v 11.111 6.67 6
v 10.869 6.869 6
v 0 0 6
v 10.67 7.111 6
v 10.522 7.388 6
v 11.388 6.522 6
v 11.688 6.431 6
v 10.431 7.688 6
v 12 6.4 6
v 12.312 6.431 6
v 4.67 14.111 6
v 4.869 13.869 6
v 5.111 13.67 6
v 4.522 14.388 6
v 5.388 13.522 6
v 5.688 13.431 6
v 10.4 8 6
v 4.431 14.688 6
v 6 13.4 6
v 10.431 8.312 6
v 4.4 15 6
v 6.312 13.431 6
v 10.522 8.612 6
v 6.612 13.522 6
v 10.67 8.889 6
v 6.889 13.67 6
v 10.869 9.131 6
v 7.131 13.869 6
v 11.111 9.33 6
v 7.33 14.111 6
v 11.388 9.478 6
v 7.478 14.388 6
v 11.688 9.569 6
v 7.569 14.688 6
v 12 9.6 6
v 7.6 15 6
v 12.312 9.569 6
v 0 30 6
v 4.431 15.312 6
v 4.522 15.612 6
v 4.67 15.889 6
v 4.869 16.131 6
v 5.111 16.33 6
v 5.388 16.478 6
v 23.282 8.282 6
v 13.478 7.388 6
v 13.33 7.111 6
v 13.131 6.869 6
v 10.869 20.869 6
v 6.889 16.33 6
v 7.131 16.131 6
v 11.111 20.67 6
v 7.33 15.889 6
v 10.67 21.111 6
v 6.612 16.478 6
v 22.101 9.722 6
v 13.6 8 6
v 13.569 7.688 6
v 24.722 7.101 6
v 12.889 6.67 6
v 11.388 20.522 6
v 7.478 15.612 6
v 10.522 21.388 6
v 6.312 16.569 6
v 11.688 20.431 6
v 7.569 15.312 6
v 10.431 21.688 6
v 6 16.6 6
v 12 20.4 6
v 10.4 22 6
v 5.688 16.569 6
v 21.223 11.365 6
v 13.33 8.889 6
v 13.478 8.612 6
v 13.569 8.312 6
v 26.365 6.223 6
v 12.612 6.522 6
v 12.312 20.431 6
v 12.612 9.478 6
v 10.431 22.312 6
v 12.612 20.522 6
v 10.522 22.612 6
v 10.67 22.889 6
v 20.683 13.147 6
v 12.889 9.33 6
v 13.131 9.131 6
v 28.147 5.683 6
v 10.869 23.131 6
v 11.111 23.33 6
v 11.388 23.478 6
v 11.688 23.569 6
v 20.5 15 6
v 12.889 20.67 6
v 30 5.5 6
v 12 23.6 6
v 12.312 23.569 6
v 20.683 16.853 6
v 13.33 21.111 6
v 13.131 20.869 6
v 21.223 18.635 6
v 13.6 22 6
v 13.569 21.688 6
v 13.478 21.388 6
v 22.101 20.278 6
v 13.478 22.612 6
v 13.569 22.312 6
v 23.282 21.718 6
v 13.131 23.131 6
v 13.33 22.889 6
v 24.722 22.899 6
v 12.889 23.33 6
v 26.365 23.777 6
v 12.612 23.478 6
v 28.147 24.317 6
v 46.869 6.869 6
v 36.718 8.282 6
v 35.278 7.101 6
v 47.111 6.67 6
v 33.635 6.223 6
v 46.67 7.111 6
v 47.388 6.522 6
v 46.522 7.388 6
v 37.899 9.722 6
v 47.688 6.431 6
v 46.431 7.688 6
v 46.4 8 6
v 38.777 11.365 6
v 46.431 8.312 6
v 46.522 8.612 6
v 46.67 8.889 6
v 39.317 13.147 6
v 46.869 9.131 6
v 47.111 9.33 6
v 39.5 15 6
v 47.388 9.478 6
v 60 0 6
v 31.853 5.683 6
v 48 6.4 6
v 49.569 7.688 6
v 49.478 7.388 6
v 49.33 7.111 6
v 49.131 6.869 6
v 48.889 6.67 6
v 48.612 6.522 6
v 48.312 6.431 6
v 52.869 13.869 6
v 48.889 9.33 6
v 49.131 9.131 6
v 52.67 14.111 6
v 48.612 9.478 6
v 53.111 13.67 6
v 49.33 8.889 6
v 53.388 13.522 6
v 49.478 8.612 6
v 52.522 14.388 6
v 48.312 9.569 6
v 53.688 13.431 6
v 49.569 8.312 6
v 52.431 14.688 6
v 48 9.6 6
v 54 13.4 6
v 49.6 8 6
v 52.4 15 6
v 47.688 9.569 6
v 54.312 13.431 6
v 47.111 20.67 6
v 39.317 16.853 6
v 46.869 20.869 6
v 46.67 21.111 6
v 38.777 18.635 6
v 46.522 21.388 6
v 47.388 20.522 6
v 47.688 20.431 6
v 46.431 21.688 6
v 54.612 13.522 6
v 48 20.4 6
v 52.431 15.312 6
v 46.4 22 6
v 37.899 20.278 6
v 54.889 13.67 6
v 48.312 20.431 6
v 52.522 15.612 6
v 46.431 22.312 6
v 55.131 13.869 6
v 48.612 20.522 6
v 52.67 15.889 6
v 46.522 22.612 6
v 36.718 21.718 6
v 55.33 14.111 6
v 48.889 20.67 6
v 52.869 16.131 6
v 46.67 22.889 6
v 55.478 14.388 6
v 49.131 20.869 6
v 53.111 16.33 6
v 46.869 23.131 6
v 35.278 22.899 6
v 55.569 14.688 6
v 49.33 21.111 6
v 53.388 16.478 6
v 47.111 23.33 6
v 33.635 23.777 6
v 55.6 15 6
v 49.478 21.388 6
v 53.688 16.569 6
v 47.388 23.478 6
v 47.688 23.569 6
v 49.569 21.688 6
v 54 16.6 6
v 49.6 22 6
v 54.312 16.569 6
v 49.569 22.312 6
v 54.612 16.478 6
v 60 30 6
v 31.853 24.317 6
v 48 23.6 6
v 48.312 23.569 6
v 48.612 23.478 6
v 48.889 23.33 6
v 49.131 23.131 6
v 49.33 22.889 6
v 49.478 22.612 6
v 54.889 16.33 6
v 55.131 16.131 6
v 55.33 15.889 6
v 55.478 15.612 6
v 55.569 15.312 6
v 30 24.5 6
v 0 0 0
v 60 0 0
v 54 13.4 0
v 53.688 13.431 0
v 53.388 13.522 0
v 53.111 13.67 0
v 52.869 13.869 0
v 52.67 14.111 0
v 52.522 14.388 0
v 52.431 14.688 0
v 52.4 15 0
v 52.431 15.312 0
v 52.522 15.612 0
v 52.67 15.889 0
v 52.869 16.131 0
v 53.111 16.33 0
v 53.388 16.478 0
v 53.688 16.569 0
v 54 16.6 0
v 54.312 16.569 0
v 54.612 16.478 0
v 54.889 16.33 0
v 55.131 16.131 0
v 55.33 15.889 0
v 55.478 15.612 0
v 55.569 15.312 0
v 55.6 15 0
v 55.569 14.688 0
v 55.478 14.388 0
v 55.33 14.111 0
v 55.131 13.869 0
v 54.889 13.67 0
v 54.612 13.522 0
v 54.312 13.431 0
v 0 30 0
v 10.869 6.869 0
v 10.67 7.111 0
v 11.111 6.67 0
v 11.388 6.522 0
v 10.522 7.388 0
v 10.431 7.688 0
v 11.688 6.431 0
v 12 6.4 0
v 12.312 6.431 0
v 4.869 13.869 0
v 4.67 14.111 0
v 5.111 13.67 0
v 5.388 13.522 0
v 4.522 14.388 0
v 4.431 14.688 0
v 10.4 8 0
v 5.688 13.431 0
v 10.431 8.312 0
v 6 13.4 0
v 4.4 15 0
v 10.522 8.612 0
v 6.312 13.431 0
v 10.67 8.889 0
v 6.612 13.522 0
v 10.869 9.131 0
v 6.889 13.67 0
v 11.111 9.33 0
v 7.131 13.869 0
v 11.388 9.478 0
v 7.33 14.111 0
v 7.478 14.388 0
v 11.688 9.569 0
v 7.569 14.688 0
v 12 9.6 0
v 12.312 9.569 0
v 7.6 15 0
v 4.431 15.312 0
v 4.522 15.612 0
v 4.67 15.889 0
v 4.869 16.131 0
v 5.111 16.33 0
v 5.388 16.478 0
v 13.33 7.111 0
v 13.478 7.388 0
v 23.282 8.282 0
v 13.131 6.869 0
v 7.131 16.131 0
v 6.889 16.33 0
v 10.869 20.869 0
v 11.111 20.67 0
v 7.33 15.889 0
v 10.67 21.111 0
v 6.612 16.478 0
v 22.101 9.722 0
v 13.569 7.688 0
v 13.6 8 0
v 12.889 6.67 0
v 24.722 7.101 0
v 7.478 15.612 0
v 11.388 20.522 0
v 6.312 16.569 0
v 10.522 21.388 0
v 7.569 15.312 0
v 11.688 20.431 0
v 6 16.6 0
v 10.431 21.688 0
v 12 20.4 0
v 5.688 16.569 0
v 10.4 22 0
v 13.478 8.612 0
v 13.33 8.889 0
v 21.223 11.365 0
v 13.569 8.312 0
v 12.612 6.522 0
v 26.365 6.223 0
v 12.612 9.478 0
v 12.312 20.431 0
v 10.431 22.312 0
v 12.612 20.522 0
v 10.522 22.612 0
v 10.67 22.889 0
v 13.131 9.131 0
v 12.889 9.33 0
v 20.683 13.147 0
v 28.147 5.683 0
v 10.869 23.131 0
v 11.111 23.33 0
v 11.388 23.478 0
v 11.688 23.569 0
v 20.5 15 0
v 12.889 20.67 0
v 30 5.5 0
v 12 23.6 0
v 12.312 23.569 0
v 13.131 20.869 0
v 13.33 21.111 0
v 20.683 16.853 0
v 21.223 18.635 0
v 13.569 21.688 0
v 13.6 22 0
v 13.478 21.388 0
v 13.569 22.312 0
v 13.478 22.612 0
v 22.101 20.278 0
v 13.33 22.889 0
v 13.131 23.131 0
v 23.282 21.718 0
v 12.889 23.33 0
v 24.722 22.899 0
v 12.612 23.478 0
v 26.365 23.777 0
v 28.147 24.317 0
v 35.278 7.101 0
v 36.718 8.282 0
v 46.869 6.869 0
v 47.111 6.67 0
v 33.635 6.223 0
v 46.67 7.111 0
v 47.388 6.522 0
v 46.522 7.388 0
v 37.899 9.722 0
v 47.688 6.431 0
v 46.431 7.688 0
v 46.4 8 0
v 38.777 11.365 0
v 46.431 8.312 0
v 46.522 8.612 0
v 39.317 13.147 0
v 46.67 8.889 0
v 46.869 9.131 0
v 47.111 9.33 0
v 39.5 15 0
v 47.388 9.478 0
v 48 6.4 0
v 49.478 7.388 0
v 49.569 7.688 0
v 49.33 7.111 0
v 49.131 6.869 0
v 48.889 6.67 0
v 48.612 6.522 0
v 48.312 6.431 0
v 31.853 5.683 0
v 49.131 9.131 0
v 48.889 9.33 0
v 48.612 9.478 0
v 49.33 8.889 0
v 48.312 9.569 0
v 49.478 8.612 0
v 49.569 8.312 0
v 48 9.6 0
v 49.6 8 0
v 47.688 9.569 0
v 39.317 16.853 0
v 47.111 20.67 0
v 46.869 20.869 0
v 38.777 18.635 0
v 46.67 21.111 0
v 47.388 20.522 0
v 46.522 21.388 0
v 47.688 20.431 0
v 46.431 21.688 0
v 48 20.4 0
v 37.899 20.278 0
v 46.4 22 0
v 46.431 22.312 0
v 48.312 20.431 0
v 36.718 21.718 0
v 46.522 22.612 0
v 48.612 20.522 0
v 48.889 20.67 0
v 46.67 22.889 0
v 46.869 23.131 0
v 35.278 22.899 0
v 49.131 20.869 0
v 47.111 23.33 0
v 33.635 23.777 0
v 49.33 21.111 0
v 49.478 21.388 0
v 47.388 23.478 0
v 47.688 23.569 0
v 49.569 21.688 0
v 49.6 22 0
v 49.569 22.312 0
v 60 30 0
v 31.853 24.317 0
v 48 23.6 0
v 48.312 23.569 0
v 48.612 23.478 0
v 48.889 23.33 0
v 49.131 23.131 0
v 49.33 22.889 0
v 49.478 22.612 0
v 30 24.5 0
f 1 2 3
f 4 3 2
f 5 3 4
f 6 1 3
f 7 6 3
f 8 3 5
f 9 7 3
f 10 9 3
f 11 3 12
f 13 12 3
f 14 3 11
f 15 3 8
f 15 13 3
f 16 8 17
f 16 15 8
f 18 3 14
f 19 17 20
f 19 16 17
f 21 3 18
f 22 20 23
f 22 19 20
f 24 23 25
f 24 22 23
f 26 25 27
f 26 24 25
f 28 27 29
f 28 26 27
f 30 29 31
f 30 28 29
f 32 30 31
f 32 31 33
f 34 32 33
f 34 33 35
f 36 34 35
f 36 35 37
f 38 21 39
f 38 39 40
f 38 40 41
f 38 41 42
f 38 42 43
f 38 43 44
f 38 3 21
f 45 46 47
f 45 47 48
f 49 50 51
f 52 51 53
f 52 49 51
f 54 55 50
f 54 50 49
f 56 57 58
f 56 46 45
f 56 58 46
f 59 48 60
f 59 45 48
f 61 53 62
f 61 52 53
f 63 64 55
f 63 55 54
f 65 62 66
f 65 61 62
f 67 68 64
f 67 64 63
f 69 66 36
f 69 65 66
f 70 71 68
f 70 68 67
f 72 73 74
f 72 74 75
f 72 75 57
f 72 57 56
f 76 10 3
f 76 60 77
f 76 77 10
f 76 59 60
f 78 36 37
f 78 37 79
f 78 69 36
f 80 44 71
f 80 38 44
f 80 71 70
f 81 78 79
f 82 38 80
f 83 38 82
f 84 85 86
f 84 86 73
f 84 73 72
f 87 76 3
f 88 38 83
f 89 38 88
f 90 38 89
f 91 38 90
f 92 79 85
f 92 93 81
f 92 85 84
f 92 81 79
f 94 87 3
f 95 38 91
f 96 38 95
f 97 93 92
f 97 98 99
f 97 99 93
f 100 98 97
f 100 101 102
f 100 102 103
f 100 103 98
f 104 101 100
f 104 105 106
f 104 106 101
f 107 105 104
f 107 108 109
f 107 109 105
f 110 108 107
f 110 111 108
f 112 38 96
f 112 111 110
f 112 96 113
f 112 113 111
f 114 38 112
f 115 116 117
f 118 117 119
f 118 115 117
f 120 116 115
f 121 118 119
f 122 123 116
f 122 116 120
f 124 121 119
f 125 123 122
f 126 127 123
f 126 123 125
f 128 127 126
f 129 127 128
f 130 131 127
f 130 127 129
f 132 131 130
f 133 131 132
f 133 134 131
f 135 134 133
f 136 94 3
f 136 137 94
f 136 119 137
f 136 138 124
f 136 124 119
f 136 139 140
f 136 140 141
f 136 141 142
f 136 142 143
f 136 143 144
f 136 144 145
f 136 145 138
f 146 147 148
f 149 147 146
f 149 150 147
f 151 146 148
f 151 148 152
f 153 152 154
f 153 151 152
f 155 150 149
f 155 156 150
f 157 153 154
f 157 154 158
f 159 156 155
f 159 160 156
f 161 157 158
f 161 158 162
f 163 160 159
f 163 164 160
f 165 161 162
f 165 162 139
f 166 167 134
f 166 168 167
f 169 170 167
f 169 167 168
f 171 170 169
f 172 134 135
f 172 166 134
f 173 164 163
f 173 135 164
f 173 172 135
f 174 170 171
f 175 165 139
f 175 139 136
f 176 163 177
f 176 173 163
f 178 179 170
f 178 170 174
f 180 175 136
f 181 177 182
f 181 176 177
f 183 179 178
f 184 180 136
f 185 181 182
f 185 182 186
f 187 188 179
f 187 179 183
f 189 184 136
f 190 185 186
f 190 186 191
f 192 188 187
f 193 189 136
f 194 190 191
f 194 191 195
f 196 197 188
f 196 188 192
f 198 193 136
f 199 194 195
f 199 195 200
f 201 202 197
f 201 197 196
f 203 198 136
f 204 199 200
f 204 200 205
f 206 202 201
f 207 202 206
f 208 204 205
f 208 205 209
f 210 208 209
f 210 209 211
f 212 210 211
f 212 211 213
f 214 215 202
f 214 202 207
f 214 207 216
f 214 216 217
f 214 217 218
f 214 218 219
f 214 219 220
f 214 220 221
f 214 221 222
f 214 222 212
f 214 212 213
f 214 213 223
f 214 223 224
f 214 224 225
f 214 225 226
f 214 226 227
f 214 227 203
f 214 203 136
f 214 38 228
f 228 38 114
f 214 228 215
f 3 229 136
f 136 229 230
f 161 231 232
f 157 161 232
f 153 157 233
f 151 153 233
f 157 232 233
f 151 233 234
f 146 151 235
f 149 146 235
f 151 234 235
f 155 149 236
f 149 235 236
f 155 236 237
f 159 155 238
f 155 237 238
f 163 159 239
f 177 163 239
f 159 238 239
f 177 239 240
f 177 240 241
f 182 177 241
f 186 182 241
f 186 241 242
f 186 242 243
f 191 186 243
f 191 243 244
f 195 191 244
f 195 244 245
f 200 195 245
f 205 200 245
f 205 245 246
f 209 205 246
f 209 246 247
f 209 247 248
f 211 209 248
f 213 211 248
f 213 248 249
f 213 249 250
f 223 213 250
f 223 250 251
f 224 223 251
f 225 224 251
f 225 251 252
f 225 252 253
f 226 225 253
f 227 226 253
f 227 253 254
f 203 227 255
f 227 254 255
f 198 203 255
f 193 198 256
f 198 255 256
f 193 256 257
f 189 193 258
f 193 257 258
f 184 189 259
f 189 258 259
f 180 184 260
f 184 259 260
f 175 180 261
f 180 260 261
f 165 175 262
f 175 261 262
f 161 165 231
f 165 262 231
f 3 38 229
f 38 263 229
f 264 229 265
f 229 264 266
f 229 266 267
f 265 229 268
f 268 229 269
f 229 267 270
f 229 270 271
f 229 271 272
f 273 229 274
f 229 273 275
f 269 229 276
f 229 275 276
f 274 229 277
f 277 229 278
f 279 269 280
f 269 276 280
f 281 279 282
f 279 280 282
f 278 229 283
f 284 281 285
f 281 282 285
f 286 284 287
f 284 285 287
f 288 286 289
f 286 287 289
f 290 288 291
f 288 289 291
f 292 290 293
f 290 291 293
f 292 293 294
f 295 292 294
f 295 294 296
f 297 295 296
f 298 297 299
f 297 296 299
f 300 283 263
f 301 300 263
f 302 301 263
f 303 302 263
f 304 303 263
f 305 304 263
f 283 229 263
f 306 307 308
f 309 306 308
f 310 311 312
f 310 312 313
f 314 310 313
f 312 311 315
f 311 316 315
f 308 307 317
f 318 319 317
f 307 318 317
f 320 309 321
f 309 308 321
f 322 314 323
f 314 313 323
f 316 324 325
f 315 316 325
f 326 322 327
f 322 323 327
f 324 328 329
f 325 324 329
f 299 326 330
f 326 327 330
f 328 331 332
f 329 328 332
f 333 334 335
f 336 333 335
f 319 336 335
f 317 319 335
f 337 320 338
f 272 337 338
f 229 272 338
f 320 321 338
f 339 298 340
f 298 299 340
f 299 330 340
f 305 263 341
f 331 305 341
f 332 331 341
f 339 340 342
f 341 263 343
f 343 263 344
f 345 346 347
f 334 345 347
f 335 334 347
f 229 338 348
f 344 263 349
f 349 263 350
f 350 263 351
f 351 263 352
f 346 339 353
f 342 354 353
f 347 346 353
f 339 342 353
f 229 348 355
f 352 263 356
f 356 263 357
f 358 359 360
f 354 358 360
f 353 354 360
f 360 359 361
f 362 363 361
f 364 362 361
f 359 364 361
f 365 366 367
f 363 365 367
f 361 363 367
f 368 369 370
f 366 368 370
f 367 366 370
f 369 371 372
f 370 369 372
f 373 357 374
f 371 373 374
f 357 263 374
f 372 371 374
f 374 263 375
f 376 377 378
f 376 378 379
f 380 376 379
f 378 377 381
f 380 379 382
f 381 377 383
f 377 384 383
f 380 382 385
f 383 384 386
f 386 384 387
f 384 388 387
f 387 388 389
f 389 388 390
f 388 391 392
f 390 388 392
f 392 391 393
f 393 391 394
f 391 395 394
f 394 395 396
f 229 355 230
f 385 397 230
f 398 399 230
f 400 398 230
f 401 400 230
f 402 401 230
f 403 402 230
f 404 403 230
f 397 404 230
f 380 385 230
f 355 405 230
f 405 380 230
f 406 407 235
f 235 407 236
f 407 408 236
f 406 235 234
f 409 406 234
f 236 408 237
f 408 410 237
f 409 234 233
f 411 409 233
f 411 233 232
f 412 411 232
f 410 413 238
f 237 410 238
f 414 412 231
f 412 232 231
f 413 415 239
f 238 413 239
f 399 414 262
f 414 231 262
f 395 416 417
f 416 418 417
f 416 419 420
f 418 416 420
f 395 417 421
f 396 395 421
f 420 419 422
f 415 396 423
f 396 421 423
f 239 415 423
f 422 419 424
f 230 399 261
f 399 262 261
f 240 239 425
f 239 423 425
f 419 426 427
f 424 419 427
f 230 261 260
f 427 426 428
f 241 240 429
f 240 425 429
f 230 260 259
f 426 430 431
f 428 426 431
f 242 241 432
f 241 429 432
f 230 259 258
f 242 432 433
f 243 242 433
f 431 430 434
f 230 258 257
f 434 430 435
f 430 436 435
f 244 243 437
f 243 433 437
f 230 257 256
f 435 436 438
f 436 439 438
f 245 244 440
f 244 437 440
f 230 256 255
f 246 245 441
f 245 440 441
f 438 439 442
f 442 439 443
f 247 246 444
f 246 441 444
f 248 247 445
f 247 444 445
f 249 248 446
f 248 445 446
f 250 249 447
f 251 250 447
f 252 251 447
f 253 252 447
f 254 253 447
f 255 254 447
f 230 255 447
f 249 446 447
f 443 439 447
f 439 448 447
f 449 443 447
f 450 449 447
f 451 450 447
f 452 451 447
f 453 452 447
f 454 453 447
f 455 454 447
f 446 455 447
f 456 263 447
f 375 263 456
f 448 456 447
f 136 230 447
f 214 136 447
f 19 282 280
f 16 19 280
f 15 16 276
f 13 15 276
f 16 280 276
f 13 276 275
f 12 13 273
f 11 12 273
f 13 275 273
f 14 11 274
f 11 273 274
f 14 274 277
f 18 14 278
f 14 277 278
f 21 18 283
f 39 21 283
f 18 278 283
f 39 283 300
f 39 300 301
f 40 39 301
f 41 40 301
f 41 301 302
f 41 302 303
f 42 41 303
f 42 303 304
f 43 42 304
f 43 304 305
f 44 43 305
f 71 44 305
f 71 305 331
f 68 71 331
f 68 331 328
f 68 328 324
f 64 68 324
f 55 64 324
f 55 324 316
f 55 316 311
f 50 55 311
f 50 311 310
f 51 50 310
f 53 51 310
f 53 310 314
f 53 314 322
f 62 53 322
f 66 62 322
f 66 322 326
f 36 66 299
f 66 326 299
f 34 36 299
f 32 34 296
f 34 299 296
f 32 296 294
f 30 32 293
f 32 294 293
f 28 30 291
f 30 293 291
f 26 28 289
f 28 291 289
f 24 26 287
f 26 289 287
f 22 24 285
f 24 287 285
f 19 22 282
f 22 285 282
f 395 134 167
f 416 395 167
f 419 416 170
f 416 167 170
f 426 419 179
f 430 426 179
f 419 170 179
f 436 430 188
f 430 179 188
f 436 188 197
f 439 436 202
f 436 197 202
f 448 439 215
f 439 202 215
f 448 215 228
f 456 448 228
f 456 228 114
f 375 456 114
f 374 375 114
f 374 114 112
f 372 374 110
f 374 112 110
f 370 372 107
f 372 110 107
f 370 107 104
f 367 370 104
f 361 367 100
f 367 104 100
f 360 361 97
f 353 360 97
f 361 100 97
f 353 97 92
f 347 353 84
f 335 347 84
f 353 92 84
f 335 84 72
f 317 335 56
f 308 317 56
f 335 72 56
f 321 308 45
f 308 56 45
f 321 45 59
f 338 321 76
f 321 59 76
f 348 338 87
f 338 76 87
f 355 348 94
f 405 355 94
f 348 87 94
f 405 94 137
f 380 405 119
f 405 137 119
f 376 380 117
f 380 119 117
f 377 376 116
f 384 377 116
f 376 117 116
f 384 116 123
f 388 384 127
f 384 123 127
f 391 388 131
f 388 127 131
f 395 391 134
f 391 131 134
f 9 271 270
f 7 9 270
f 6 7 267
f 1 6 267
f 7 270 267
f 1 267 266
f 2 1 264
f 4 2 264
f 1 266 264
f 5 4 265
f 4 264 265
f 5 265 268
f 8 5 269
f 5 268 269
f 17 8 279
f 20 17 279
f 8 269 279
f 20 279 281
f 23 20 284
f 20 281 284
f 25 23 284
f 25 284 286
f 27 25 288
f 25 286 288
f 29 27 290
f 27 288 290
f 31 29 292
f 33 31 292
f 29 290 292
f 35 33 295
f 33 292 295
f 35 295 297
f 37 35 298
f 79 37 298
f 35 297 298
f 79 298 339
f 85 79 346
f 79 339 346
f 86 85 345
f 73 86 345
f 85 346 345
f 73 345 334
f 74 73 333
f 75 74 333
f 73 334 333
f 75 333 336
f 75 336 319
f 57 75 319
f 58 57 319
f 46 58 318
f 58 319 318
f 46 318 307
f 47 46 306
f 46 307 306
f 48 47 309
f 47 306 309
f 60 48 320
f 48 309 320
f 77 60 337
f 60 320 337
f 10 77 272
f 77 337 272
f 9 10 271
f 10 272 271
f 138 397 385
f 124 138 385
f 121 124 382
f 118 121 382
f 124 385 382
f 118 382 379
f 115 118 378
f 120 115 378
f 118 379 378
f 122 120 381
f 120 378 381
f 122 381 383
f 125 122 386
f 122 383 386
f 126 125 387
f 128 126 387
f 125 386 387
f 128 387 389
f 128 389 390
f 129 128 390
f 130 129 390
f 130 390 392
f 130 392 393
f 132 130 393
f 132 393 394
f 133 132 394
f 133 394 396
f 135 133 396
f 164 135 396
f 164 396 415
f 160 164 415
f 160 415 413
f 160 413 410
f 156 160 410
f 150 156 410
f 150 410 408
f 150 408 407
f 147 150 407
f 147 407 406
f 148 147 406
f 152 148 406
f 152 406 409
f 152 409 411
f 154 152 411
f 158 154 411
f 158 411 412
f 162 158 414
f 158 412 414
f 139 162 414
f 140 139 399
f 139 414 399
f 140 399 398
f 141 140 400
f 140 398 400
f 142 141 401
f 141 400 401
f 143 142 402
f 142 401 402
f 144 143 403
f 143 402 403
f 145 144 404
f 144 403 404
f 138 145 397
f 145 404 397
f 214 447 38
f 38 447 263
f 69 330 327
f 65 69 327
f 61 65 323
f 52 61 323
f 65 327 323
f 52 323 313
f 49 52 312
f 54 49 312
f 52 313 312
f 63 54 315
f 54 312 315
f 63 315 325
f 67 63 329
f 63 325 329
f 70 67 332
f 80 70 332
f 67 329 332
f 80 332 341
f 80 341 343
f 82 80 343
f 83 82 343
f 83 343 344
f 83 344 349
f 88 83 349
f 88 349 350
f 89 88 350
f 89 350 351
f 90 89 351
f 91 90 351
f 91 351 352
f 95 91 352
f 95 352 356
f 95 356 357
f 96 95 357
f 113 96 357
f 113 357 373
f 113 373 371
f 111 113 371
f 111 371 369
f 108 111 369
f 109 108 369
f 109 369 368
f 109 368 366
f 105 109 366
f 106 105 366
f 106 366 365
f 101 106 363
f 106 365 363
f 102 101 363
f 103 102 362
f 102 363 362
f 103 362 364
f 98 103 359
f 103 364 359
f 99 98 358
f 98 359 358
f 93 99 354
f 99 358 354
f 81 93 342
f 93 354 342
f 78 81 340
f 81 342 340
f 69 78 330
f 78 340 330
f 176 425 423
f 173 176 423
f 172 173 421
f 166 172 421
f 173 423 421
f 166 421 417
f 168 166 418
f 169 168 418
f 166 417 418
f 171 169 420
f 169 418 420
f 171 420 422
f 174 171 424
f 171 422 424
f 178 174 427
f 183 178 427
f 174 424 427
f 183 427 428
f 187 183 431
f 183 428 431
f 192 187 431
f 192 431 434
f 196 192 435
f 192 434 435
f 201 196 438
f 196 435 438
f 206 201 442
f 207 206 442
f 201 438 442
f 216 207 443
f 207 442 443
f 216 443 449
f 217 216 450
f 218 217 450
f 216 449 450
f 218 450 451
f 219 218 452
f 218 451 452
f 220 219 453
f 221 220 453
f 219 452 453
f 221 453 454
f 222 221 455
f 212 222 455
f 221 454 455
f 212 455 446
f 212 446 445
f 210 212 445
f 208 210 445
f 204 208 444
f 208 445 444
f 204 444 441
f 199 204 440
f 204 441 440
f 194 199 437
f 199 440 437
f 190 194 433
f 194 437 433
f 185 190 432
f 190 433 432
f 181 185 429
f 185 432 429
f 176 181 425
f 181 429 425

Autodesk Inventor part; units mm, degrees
ref_plane "YZ Plane" through (0, 0, 0) normal (1, 0, 0) x (0, 1, 0)
ref_plane "XZ Plane" through (0, 0, 0) normal (0, 1, 0) x (-1, 0, 0)
ref_plane "XY Plane" through (0, 0, 0) normal (0, 0, 1) x (1, 0, 0)
sketch "スケッチ1" plane through (0, 0, 0) normal (0, 0, 1) x (1, 0, 0)
  line L0 (0, 0) -> (60, 0)
  line L1 (60, 0) -> (60, 30)
  line L2 (60, 30) -> (0, 30)
  line L3 (0, 30) -> (0, 0)
  dimension "d0" = 60
  dimension "d1" = 30
extrude "押し出し1" add sketch "スケッチ1" along normal blind 6
sketch "スケッチ2" plane through (0, 0, 6) normal (0, 0, 1) x (1, 0, 0)
  circle A0 centre (30, 15) radius 9.5
  line L0 (0, 30) -> (0, 0) projected
  line L1 (60, 30) -> (0, 30) projected
  dimension "d4" = 19
  dimension "d5" = 30
  dimension "d6" = 15
extrude "押し出し2" cut sketch "スケッチ2" against normal blind 6
sketch "スケッチ3" plane through (0, 0, 6) normal (0, 0, 1) x (1, 0, 0)
  circle A0 centre (12, 22) radius 1.6
  circle A1 centre (12, 8) radius 1.6
  line L0 (60, 30) -> (0, 30) projected
  line L1 (0, 0) -> (60, 0) projected
  line L2 (0, 30) -> (0, 0) projected
  circle A2 centre (6, 15) radius 1.6
  line L3 (30, 30) -> (30, 0) construction
  line L4 (0, 0) -> (60, 0) projected
  circle A3 centre (48, 22) radius 1.6
  circle A4 centre (48, 8) radius 1.6
  circle A5 centre (54, 15) radius 1.6
  dimension "d9" = 3.2
  dimension "d10" = 3.2
  dimension "d11" = 8
  dimension "d12" = 8
  dimension "d13" = 12
  dimension "d14" = 12
  dimension "d15" = 3.2
  dimension "d16" = 15
  dimension "d17" = 6
hole "穴1" at (12, 22, 6) at (6, 15, 6) at (12, 8, 6) at (48, 22, 6) at (54, 15, 6) at (48, 8, 6) direction (0, 0, -1) diameter 3.2 depth 6
equation "\"BendRadius\" = Thickness"
equation "\"BendReliefWidth\" = Thickness"
equation "\"BendReliefDepth\" = 0.5 * Thickness"
equation "\"CornerReliefSize\" = 4 * Thickness"
equation "\"MinimumRemnant\" = 2 * Thickness"
equation "\"TransitionRadius\" = BendRadius"
equation "\"JacobiRadiusSize\" = BendRadius"
equation "\"GapSize\" = Thickness"
equation "\"Thickness\" = 0.5"
properties part number "nhk45"
